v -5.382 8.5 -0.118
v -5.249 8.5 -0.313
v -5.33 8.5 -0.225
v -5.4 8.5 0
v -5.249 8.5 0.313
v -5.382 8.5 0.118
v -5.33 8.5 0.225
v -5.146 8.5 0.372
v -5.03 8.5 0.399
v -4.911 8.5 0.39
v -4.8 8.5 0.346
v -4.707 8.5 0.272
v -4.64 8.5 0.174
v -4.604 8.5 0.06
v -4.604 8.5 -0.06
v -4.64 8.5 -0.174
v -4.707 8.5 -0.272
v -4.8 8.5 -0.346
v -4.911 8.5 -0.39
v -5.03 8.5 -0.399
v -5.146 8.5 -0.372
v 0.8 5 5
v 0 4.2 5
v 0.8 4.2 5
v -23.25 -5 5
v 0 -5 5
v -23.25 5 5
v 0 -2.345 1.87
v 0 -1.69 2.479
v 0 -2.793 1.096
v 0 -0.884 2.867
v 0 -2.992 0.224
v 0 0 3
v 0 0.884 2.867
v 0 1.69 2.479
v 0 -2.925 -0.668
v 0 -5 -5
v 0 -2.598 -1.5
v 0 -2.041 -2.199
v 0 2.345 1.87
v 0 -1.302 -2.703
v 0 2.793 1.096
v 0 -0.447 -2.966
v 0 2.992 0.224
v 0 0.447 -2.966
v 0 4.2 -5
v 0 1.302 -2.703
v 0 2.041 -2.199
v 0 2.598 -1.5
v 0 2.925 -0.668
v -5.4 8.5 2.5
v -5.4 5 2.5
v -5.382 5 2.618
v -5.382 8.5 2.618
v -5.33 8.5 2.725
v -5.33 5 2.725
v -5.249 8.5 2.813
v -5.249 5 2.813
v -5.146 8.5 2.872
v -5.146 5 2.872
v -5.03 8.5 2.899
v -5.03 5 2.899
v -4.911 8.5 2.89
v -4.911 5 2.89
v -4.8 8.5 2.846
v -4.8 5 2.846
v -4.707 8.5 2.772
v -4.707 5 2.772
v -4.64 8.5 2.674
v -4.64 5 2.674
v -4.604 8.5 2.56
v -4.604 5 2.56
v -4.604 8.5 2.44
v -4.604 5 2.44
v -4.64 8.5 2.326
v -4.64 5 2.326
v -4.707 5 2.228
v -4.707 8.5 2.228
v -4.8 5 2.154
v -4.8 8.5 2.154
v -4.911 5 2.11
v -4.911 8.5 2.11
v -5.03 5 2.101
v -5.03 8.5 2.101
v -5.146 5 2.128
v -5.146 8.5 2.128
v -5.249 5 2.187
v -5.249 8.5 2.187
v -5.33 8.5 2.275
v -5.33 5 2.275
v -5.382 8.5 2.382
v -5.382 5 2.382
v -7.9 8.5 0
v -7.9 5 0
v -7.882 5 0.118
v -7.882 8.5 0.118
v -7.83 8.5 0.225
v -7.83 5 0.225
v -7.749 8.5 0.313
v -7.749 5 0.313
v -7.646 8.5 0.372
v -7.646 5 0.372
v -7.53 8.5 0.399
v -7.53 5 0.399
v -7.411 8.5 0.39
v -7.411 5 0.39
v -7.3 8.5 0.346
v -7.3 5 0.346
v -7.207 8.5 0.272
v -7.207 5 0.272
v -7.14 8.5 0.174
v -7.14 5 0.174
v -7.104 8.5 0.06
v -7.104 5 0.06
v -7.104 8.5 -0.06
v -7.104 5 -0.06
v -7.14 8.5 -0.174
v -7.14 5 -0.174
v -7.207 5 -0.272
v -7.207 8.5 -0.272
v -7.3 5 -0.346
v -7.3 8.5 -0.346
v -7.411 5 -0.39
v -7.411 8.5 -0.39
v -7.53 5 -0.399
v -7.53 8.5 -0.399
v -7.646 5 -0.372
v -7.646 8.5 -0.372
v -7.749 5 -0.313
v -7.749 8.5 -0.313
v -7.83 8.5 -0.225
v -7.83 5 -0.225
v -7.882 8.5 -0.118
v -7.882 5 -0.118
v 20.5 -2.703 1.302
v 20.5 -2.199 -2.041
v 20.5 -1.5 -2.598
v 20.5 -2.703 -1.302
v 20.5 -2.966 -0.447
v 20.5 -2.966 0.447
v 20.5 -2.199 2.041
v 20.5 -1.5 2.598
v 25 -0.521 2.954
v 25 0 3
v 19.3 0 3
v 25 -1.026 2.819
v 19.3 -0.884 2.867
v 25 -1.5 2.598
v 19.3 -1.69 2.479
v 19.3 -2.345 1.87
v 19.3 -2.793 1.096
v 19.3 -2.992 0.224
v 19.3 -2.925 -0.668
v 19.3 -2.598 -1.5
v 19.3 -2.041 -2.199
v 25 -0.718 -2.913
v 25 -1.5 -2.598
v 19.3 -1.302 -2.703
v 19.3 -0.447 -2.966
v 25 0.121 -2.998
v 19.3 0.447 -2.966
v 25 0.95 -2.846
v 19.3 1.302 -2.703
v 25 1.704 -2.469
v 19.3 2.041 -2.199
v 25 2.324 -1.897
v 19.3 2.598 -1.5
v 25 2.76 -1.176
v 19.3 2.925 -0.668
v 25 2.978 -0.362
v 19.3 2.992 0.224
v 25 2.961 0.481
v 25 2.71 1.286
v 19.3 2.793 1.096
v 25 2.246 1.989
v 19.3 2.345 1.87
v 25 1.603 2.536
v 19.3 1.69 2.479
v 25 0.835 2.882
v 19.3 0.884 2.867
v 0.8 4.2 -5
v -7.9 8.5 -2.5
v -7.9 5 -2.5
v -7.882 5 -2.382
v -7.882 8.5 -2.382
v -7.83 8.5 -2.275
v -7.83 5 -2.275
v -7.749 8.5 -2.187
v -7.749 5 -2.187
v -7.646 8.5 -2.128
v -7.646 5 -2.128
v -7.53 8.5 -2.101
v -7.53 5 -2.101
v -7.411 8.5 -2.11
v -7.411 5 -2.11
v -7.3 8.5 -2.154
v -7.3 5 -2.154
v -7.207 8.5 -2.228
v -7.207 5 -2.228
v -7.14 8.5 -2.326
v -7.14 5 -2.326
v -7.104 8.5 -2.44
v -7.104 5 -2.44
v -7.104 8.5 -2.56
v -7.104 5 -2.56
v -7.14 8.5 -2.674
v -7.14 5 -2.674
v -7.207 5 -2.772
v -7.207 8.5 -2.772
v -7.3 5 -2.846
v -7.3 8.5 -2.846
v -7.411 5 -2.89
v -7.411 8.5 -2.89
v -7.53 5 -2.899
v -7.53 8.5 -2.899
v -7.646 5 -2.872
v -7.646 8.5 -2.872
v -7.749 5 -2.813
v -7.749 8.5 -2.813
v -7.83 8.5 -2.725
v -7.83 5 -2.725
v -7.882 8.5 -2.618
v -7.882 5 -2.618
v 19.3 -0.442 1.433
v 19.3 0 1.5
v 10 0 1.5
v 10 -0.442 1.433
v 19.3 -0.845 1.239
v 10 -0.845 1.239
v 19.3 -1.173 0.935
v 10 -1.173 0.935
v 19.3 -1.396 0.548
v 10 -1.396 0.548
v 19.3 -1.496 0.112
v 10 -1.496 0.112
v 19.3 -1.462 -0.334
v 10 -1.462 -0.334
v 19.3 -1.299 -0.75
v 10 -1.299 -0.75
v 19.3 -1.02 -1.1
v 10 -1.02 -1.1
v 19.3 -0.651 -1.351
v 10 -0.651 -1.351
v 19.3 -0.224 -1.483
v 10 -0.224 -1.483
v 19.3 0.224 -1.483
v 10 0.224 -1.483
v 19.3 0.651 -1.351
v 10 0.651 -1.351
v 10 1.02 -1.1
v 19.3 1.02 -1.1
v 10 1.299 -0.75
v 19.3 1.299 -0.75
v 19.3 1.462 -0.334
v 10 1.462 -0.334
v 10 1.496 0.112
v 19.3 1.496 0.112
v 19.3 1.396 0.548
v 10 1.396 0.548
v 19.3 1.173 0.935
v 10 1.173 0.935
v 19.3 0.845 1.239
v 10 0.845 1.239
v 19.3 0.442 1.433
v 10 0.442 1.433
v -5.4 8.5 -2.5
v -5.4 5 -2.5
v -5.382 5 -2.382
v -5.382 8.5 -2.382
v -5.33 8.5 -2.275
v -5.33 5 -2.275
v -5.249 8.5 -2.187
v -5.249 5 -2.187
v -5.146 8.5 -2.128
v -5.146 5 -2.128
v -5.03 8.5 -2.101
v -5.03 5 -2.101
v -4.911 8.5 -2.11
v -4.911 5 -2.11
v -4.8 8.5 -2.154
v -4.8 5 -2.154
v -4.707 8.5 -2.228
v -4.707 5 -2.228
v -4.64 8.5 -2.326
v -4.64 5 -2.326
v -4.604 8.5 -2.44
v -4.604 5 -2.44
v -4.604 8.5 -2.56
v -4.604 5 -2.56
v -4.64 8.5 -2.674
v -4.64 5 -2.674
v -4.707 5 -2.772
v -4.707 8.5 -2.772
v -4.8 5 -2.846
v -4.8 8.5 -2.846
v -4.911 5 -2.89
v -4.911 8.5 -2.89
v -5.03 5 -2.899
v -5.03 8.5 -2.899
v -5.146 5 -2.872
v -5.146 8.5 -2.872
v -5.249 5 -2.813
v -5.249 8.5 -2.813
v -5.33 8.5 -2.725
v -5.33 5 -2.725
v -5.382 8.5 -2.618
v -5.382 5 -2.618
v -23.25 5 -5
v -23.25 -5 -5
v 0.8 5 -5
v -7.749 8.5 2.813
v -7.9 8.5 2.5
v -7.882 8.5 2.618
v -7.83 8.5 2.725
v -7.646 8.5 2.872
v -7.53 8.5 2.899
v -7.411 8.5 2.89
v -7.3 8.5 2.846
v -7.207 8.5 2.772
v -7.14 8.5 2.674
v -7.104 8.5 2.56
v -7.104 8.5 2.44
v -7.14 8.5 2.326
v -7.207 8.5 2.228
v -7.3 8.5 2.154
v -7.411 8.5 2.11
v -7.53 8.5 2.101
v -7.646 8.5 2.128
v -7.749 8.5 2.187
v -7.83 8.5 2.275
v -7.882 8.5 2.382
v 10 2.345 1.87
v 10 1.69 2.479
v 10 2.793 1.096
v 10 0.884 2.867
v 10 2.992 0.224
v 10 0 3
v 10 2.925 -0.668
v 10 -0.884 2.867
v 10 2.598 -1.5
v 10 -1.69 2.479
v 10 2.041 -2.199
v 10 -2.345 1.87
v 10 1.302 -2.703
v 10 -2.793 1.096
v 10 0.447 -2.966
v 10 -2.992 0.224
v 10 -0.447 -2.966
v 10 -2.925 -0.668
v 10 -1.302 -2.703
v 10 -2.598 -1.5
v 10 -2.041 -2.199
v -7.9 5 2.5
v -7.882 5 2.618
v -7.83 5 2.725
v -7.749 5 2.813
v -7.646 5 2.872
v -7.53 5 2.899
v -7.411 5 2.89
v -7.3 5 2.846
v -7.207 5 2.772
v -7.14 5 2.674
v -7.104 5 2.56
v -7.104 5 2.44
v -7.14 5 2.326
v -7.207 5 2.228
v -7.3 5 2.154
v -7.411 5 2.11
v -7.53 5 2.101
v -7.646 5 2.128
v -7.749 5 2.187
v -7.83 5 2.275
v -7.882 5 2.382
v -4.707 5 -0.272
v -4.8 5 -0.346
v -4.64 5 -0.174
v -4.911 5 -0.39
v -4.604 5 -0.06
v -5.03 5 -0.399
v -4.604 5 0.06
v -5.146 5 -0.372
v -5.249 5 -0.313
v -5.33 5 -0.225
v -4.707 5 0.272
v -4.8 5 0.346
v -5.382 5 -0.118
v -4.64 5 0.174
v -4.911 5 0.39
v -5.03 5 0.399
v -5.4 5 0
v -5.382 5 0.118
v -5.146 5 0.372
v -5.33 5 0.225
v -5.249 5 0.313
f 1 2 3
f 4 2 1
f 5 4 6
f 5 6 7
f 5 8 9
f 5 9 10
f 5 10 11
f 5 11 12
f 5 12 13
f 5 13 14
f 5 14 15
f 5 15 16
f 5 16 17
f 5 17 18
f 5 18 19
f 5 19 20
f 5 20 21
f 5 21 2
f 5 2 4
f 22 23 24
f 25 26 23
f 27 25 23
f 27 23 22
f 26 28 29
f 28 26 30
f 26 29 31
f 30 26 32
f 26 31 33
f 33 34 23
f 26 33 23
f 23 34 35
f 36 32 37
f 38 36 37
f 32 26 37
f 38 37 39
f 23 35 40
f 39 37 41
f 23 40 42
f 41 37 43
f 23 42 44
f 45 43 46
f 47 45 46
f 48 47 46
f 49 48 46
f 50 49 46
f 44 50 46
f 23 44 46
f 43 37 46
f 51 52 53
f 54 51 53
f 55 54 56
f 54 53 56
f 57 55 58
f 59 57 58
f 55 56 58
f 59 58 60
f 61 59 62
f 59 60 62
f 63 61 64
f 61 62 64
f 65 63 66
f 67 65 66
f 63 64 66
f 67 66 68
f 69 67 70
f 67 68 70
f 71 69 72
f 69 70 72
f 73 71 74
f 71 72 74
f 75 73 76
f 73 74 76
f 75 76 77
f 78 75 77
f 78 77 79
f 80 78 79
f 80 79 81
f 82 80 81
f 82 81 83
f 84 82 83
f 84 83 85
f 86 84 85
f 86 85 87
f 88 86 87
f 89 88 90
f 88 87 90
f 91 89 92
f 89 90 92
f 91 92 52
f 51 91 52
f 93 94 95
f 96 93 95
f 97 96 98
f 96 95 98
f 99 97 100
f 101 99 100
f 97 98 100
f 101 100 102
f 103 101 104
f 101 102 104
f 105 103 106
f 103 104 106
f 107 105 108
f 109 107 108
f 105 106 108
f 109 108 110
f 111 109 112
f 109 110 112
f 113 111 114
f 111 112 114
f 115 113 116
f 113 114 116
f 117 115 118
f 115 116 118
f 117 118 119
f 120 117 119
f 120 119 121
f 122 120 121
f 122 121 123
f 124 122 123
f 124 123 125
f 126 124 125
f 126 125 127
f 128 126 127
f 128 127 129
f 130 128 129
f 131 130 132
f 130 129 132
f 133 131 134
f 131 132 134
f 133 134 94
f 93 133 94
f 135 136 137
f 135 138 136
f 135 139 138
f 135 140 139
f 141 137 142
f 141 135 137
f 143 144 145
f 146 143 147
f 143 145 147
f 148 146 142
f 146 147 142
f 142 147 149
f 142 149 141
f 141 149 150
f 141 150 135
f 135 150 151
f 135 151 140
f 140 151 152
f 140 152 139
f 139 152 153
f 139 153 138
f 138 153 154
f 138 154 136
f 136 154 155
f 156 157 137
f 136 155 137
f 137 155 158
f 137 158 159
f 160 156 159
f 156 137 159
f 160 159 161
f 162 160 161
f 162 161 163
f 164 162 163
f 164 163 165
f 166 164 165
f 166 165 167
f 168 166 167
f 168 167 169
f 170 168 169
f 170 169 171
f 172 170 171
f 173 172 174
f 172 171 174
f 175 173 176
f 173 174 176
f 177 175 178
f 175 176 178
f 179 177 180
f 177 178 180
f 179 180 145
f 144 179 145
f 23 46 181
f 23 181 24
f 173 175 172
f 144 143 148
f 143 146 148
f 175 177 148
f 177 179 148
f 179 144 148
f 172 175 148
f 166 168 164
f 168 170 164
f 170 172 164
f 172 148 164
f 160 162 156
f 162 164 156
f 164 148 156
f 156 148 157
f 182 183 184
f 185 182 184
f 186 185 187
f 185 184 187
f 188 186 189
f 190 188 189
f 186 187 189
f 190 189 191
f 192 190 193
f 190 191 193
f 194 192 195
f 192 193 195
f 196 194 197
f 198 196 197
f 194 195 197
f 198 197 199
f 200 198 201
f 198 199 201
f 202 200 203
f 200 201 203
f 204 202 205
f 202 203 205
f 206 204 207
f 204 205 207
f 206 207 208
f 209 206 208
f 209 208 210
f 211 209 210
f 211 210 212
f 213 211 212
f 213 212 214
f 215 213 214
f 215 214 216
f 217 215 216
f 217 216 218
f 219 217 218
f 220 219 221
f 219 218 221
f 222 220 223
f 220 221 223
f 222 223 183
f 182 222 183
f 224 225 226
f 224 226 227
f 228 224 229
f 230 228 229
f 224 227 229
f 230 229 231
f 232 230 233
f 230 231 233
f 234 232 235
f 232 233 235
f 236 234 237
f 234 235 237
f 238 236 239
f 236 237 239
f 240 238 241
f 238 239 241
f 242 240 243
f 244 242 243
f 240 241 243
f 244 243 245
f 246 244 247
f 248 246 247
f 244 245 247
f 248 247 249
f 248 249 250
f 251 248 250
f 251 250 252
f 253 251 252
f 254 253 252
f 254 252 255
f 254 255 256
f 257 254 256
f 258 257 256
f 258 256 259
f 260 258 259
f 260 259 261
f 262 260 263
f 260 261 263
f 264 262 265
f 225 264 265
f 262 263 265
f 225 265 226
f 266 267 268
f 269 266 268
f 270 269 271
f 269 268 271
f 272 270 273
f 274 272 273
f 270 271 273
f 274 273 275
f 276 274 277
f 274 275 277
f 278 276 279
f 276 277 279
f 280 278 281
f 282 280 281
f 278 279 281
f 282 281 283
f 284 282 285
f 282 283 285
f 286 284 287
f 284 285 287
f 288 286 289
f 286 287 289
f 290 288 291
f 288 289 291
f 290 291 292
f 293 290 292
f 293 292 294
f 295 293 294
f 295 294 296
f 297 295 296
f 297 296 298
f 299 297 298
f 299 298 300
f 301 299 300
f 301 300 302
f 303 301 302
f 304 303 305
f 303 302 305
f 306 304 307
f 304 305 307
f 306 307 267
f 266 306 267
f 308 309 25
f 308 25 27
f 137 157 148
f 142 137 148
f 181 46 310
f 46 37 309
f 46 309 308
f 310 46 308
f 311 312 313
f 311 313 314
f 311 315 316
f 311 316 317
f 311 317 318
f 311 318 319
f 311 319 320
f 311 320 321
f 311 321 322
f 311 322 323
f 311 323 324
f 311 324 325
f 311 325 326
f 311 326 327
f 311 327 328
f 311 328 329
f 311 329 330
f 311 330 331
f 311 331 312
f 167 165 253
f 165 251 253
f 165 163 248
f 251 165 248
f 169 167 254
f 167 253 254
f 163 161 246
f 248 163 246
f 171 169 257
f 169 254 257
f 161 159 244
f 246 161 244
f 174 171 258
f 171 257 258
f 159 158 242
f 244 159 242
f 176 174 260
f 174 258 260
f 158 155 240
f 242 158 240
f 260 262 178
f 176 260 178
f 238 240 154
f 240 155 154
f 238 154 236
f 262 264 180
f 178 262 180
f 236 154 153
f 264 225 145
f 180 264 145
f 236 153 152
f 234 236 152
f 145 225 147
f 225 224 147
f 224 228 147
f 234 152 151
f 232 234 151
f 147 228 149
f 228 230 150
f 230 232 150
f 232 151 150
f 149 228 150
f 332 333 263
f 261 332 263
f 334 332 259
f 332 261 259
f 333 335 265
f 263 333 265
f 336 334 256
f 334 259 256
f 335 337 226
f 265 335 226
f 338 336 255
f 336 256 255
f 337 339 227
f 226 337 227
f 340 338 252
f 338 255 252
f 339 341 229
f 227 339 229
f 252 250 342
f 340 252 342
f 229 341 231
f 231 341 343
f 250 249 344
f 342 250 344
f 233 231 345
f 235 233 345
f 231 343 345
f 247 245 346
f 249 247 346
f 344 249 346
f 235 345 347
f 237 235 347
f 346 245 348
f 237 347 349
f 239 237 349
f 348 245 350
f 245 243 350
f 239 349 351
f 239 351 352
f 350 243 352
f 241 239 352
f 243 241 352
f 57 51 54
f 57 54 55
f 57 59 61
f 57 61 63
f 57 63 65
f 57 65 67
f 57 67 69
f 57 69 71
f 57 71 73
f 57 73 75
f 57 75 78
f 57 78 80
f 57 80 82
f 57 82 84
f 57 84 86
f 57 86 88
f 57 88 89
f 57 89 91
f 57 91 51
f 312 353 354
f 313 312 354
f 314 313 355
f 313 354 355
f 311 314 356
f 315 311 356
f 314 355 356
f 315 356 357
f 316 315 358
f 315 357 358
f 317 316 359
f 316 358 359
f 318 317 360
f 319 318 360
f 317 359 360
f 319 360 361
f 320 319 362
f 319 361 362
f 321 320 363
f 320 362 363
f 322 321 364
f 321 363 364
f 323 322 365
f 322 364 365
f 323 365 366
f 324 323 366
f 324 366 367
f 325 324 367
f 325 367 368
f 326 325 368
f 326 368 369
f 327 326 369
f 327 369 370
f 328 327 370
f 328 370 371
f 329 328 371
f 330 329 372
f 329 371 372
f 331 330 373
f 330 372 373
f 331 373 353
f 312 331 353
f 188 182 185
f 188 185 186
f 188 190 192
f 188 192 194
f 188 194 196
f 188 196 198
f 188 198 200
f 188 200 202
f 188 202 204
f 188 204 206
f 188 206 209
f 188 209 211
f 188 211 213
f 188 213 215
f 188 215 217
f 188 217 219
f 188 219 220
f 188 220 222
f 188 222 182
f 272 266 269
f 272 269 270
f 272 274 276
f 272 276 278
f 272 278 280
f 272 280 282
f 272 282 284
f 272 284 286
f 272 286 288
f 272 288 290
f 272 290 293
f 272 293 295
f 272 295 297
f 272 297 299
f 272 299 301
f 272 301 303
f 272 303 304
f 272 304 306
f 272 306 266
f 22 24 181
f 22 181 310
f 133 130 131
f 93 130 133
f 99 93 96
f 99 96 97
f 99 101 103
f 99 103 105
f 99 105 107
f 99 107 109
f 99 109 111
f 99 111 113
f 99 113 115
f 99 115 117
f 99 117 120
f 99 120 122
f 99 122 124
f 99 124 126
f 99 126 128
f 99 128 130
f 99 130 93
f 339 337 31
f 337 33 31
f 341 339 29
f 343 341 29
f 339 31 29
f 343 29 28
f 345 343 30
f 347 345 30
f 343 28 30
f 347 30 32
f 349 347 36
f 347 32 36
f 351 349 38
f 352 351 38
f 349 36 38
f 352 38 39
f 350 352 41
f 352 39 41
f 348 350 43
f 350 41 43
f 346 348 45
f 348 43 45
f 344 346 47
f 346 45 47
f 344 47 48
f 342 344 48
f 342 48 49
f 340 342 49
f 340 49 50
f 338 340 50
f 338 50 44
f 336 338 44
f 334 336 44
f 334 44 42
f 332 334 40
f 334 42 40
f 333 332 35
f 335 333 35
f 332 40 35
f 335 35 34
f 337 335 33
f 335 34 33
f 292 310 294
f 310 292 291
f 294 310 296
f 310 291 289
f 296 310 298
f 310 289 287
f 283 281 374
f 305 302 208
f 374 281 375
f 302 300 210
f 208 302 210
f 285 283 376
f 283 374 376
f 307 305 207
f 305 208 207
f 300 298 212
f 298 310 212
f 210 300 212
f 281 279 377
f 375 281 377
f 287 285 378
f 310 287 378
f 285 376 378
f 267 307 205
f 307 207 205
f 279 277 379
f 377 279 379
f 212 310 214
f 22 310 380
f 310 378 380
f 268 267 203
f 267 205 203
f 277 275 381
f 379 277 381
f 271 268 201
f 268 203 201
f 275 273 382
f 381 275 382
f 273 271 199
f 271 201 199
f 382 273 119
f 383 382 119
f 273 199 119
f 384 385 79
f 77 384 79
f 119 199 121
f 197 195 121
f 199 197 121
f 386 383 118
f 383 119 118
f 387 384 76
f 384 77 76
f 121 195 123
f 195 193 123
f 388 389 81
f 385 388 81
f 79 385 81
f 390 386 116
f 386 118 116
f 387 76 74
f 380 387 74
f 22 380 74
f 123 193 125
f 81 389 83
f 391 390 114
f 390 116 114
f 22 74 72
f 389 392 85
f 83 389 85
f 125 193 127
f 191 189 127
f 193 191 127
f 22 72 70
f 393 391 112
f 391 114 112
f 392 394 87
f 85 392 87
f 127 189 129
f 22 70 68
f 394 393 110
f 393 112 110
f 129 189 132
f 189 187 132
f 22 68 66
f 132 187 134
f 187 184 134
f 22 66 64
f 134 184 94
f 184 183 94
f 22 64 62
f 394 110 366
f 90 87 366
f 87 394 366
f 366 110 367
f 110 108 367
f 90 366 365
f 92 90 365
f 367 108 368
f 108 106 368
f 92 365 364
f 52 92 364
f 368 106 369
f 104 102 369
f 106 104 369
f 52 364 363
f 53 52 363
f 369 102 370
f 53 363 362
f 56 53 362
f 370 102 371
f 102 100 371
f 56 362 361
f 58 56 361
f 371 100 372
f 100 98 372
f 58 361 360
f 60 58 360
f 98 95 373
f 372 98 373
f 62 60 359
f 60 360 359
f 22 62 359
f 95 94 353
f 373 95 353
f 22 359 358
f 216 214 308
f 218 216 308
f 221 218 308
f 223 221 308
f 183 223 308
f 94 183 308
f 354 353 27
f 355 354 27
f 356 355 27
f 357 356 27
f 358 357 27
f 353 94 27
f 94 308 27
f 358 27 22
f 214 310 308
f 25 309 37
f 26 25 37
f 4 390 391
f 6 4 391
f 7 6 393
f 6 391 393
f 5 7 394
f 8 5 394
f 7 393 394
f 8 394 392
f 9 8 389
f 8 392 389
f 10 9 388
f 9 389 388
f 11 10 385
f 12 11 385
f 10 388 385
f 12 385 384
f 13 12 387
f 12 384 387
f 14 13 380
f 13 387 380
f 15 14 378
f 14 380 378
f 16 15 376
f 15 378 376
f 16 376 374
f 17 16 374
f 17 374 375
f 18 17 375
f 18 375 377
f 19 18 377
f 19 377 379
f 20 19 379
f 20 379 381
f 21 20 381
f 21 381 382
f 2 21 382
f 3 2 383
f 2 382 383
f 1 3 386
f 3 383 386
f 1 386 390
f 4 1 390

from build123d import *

# Parameters (mm, degrees)
POCKET_DEPTH = 4.5
BOX_W        = 23.25
BOX_H        = 10
BOX_DEPTH    = 10
SKETCH002_R  = 0.4
PAD_DEPTH    = 3.5
SKETCH003_W  = 0.8
SKETCH003_H  = 10
PAD001_DEPTH = 0.8


with BuildPart() as pocket:
    # Sketch → Revolution (revolve)
    with BuildSketch(Plane.XZ):
        Polygon((10, 3), (0, 3), (0, 0), (25, 0), (25, 3), (19.3, 3), (19.3, 1.5), (10, 1.5), align=None)
    revolve(axis=Axis((0, 0, 0), (1, 0, 0)))

    # Sketch001 → Pocket (cut)
    with BuildSketch(Plane(origin=(25, 0, 0), x_dir=(0, 0, 1), z_dir=(1, 0, 0))):
        with BuildLine():
            ThreePointArc((3, 1.5), (0, 4.499985), (-3, 1.5))
            Line((-3, 1.5), (3, 1.5))
        make_face()
    extrude(amount=-POCKET_DEPTH, mode=Mode.SUBTRACT)


with BuildPart() as fusion:
    # Box → Box (new body)
    with BuildSketch(Plane(origin=(-23.25, -5, -5), x_dir=(1, 0, 0), z_dir=(0, 0, 1))):
        with Locations((11.625, 5)):
            Rectangle(BOX_W, BOX_H)
    extrude(amount=BOX_DEPTH)

    # Sketch002 → Pad (new body)
    with BuildSketch(Plane(origin=(-23.25, 5, -5), x_dir=(-1, 0, 0), z_dir=(0, 1, 0))):
        with Locations((-18.25, 7.5)):
            Circle(SKETCH002_R)
        with Locations((-18.25, 5)):
            Circle(SKETCH002_R)
        with Locations((-18.25, 2.5)):
            Circle(SKETCH002_R)
        with Locations((-15.75, 7.5)):
            Circle(SKETCH002_R)
        with Locations((-15.75, 5)):
            Circle(SKETCH002_R)
        with Locations((-15.75, 2.5)):
            Circle(SKETCH002_R)
    extrude(amount=PAD_DEPTH)

    # Sketch003 → Pad001 (new body)
    with BuildSketch(Plane(origin=(0, -5, -5), x_dir=(0, 1, 0), z_dir=(1, 0, 0))):
        with Locations((9.6, 5)):
            Rectangle(SKETCH003_W, SKETCH003_H)
    extrude(amount=PAD001_DEPTH)

    # Fusion: union Pocket
    add(pocket.part)


solid = fusion.part
